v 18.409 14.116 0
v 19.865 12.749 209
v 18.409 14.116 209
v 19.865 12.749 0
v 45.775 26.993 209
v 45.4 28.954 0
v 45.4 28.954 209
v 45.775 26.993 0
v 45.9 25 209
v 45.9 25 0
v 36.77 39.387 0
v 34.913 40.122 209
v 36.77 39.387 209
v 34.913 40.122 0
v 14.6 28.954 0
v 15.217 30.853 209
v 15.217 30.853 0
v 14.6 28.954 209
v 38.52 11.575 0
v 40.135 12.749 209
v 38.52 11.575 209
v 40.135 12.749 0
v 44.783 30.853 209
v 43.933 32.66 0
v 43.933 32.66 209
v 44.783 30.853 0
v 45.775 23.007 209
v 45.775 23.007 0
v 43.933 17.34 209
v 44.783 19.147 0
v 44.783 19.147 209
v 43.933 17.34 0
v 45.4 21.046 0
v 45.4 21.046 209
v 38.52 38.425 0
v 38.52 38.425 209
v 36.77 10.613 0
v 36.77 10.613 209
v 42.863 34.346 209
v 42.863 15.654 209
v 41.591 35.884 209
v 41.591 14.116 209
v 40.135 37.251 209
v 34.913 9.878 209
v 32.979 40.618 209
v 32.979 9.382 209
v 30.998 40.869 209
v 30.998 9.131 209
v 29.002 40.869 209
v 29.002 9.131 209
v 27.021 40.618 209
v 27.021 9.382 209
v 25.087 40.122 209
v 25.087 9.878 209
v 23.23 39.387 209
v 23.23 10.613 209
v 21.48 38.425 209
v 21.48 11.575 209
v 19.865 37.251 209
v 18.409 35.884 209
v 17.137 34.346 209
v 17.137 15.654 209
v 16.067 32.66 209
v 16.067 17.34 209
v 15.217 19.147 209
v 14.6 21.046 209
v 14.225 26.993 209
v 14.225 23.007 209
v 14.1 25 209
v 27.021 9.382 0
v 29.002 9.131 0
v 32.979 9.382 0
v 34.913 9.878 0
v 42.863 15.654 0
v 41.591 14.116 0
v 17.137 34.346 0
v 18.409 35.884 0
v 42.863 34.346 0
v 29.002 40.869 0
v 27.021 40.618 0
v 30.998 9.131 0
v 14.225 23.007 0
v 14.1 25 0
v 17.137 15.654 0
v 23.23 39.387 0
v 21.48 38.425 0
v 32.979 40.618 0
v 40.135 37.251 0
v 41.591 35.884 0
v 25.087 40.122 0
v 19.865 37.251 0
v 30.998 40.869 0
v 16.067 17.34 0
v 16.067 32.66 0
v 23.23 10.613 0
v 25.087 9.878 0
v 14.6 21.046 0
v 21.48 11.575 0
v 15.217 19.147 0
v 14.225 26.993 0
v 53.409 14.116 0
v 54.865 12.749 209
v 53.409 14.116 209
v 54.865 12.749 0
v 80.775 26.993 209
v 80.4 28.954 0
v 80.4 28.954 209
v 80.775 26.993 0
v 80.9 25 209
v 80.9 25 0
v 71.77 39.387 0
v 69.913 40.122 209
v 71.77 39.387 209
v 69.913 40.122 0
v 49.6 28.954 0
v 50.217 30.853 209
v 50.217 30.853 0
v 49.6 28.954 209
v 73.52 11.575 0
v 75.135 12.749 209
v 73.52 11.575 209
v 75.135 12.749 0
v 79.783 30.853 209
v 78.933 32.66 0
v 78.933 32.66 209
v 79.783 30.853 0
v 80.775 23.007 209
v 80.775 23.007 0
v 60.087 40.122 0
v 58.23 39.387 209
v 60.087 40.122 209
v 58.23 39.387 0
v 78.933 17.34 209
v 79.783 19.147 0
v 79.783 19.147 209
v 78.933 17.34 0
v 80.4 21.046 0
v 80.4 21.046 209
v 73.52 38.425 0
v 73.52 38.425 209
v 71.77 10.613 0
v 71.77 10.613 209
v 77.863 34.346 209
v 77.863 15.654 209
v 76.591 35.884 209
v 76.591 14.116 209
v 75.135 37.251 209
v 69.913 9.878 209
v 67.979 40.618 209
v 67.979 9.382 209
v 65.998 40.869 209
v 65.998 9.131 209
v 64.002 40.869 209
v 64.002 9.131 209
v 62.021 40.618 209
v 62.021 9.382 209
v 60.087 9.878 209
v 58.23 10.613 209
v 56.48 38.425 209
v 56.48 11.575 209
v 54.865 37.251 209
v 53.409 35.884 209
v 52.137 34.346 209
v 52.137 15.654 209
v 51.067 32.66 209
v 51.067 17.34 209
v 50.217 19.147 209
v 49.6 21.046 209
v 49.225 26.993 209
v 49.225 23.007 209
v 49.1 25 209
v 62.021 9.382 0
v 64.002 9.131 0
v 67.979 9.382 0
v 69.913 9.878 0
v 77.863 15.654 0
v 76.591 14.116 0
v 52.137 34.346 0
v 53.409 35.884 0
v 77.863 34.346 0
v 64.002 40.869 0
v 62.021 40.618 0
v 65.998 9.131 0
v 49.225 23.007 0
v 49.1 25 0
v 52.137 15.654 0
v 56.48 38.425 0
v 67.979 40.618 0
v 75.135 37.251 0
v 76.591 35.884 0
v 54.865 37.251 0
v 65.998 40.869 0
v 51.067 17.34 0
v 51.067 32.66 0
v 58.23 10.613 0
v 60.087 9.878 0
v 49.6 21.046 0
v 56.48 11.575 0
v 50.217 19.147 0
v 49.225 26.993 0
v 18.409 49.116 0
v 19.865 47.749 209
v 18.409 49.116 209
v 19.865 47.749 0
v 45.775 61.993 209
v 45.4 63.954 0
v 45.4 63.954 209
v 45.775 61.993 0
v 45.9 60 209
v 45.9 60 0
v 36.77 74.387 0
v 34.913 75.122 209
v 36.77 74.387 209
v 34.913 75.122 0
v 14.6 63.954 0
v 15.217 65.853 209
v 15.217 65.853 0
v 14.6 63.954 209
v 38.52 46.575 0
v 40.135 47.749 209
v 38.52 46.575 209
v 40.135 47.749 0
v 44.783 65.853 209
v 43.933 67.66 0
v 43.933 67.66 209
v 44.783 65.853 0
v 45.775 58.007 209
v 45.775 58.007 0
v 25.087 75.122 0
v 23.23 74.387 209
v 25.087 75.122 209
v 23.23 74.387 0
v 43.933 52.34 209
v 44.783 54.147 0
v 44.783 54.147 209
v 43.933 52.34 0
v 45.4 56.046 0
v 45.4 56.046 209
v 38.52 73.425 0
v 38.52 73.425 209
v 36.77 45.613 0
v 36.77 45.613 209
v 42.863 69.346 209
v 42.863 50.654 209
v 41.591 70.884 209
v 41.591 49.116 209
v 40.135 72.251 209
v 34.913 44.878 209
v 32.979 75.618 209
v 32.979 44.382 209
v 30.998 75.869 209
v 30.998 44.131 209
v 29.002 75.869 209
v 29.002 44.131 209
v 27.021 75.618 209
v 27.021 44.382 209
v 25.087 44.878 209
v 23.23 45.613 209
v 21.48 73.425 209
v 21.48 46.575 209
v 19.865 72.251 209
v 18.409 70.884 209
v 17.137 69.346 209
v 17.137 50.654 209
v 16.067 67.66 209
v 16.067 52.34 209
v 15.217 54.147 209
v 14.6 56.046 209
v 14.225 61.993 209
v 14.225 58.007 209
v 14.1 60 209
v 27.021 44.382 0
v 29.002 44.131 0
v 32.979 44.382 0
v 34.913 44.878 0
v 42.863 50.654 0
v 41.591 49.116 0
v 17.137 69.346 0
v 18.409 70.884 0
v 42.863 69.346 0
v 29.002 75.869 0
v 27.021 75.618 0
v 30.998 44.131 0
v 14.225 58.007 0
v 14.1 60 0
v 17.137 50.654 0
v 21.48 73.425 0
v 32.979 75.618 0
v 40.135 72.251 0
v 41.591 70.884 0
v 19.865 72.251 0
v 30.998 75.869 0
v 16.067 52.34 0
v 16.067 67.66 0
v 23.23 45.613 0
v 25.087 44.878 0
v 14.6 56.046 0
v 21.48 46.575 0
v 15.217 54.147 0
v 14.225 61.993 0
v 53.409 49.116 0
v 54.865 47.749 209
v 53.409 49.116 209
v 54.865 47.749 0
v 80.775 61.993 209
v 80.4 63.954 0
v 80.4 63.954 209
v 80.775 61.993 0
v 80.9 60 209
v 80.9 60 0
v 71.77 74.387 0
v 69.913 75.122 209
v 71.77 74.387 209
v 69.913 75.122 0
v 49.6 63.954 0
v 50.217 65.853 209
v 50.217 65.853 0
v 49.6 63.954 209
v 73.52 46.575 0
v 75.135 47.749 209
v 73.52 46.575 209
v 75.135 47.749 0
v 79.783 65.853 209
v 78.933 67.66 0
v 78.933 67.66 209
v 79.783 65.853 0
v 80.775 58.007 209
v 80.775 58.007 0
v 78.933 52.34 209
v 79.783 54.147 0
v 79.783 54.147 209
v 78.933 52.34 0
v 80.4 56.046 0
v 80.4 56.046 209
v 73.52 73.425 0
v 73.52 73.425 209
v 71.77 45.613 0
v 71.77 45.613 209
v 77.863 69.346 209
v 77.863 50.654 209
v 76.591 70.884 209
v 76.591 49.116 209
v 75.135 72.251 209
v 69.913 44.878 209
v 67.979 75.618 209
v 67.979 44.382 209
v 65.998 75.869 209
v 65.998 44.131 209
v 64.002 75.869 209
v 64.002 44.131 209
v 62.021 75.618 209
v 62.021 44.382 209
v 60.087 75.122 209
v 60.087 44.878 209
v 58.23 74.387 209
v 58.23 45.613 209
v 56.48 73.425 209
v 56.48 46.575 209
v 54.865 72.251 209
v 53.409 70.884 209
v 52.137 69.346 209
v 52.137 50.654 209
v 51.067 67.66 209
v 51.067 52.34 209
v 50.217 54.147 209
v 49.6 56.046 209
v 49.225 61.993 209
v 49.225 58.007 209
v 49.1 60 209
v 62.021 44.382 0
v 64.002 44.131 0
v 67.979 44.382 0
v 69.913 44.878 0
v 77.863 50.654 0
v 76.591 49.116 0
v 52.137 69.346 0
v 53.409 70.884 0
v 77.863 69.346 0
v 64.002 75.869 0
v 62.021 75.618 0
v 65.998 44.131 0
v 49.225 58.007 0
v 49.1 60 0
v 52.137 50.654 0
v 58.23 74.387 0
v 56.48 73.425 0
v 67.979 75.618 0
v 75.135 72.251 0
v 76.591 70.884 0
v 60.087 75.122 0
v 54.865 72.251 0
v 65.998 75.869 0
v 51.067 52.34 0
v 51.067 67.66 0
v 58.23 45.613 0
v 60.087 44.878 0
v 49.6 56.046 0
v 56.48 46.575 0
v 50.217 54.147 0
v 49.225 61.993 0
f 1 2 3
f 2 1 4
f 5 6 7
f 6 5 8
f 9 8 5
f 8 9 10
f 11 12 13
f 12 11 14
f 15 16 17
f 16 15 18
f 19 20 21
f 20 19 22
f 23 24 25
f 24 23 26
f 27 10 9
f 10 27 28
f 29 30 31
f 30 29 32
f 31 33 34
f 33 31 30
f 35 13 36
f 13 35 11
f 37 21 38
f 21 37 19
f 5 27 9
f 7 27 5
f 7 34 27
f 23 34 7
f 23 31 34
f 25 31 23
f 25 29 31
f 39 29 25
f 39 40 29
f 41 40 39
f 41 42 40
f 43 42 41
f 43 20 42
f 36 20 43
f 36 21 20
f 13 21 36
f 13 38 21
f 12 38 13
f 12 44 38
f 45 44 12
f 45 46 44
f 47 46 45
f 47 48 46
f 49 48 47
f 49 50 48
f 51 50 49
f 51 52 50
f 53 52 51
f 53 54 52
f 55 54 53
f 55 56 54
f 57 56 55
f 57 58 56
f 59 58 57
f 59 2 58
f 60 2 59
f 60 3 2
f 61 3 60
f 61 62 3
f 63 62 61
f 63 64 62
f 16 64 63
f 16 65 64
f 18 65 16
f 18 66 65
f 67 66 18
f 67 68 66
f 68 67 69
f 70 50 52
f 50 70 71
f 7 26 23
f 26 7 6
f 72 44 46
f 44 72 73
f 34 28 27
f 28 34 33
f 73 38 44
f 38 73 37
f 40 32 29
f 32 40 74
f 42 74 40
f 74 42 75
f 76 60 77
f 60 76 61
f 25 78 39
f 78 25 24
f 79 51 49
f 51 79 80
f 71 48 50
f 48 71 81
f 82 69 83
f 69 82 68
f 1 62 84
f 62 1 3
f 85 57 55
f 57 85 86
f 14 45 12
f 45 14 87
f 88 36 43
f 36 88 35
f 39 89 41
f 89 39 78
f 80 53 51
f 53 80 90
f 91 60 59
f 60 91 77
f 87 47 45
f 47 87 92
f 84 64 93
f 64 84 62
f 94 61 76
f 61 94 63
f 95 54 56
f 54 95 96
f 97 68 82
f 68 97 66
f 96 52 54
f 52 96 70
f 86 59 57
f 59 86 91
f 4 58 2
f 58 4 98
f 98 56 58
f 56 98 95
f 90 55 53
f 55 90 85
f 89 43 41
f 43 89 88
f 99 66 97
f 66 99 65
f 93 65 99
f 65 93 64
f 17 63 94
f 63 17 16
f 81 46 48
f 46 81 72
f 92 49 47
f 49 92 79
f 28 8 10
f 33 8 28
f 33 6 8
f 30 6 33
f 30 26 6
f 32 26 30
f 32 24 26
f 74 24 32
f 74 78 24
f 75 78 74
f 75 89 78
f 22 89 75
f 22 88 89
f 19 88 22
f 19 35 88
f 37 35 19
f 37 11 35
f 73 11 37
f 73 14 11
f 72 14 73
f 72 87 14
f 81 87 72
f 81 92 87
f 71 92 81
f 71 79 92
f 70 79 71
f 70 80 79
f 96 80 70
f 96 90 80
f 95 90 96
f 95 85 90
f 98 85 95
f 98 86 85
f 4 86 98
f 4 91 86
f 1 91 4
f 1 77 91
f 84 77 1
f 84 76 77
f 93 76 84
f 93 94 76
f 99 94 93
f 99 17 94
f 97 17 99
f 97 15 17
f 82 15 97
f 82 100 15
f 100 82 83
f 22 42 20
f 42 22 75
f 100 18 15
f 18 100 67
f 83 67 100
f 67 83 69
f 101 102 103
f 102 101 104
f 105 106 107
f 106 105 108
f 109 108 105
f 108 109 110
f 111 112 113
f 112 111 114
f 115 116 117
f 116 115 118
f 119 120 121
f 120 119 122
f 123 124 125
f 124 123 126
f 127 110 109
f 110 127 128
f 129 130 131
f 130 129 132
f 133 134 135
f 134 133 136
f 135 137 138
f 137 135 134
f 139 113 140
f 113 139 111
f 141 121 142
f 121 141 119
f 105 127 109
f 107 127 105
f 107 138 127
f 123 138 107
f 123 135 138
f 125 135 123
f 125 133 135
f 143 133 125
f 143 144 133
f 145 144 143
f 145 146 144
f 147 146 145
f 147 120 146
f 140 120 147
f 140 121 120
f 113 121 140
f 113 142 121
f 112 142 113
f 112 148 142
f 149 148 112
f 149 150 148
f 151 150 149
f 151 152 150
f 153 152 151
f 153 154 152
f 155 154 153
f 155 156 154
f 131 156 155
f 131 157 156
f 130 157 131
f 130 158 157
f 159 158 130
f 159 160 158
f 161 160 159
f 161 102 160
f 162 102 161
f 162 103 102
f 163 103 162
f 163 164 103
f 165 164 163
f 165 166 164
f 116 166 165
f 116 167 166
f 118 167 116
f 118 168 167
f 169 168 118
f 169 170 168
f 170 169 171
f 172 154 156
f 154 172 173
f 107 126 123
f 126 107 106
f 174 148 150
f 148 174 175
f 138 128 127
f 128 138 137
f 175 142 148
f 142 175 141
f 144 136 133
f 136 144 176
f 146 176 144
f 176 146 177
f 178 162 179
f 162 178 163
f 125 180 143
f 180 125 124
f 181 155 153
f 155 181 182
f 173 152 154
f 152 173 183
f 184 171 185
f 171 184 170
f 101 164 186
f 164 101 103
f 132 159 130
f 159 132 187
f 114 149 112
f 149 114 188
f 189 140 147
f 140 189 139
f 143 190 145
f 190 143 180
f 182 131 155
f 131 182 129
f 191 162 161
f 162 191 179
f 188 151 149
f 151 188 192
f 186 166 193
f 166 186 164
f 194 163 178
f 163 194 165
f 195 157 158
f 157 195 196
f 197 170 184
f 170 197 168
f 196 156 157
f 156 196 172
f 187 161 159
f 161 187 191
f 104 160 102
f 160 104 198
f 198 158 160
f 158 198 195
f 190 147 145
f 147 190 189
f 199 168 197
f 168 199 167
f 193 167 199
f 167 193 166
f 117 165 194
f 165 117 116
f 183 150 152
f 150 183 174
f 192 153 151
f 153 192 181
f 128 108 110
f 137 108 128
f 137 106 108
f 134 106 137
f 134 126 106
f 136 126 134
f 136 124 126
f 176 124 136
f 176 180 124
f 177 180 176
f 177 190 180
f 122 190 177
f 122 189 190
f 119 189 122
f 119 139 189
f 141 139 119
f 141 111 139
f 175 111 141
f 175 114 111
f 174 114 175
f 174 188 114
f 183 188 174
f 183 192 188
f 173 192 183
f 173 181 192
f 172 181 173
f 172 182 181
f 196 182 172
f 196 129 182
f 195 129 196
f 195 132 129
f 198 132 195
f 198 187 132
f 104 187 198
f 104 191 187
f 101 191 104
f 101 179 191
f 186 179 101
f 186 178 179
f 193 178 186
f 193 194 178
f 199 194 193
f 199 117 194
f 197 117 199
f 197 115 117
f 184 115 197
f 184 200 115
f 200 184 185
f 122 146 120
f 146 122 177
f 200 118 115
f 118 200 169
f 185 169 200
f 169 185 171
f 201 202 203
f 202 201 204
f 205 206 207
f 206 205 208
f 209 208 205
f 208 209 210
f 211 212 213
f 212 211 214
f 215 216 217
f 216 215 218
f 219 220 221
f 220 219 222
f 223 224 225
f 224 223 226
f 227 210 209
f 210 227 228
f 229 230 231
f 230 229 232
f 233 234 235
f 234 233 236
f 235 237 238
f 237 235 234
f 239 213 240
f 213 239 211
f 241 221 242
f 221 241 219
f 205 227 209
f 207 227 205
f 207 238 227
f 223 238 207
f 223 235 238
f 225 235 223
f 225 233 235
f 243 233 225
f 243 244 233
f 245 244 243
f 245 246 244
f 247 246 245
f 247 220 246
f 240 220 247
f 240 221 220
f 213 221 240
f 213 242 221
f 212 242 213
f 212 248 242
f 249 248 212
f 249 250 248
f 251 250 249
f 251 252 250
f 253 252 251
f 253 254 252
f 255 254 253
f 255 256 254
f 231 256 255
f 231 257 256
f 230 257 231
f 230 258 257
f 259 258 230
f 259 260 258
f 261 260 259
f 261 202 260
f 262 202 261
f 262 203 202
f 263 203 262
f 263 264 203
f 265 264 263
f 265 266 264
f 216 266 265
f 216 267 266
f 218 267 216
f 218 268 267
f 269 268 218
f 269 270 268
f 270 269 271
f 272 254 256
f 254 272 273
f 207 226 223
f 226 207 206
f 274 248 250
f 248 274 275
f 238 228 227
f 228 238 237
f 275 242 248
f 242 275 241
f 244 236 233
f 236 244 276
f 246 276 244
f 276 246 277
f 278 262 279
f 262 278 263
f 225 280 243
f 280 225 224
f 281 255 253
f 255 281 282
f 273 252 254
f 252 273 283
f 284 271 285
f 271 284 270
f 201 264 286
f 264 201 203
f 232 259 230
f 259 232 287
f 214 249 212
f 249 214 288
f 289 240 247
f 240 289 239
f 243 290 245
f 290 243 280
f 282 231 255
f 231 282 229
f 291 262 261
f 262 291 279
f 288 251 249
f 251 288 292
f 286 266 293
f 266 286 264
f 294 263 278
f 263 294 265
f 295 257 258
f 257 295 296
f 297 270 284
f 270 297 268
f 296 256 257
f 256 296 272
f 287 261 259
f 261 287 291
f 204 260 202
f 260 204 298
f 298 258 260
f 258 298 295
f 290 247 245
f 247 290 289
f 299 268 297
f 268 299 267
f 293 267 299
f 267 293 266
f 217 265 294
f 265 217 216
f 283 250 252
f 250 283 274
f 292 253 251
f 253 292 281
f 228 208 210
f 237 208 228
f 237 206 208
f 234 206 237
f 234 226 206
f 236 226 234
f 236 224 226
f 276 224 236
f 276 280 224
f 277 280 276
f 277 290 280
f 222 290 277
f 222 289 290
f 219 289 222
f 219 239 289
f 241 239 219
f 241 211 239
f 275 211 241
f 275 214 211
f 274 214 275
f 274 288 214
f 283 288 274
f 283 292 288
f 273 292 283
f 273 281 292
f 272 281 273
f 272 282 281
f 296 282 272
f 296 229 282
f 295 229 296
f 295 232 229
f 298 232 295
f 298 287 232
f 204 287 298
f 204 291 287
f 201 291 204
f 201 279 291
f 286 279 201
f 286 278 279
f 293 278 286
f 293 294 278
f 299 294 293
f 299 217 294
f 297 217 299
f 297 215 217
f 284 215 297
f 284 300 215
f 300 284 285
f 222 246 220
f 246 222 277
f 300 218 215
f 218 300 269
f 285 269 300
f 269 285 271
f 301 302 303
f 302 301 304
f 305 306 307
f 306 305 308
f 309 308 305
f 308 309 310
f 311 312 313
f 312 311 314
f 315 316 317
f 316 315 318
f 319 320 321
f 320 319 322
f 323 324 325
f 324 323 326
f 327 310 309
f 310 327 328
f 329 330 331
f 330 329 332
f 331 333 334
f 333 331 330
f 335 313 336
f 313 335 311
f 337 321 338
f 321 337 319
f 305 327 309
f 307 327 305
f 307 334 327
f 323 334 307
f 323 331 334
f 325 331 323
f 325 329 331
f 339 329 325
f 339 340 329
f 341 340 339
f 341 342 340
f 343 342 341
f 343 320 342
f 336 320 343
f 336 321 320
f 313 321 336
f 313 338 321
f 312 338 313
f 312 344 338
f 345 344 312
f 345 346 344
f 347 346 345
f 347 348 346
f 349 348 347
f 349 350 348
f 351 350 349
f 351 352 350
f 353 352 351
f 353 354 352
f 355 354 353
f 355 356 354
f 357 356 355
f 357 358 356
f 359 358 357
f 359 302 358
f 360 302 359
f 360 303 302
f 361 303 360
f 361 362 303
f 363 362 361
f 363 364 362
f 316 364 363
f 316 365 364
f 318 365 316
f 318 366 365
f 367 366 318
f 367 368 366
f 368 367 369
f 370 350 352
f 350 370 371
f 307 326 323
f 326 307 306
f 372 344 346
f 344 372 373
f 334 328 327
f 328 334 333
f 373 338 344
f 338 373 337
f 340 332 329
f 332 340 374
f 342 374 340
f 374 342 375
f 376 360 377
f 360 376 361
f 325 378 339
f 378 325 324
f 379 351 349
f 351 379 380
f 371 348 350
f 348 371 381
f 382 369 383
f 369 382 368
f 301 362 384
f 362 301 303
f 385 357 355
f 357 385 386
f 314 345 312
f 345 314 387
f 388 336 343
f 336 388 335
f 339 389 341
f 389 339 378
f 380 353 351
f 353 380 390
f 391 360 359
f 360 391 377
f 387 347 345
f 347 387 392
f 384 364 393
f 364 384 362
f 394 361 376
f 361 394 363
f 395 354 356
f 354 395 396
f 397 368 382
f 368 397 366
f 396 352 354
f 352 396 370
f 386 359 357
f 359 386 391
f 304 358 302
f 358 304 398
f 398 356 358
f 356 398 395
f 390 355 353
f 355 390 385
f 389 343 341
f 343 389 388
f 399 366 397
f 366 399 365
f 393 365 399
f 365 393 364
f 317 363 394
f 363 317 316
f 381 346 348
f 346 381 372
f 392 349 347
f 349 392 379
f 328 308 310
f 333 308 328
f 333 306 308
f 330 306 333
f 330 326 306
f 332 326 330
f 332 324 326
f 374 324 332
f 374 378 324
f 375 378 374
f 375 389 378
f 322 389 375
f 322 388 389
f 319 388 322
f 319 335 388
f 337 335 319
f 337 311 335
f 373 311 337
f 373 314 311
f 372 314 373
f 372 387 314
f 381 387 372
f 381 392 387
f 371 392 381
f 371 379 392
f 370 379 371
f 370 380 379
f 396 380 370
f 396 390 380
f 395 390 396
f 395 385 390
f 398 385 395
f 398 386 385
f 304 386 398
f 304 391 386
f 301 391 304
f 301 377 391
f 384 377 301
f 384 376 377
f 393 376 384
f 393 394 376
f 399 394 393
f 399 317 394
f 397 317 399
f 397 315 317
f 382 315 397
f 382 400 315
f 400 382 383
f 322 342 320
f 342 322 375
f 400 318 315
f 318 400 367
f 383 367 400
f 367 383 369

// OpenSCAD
// Build Volume 250 x 210 x 210 mm

//200 x 273, 2 slack, 3 rim

$fn=50;

width=210;
length=200;
base_thickness=3;
support_radius=15.9;

difference() {

    // adds
    union() {
        translate([30,25,0]) cylinder(h=209,r=support_radius);
        translate([65,25,0]) cylinder(h=209,r=support_radius);
        translate([30,60,0]) cylinder(h=209,r=support_radius);
        translate([65,60,0]) cylinder(h=209,r=support_radius);
    }

    // subtracts
    union() {
    }


}
